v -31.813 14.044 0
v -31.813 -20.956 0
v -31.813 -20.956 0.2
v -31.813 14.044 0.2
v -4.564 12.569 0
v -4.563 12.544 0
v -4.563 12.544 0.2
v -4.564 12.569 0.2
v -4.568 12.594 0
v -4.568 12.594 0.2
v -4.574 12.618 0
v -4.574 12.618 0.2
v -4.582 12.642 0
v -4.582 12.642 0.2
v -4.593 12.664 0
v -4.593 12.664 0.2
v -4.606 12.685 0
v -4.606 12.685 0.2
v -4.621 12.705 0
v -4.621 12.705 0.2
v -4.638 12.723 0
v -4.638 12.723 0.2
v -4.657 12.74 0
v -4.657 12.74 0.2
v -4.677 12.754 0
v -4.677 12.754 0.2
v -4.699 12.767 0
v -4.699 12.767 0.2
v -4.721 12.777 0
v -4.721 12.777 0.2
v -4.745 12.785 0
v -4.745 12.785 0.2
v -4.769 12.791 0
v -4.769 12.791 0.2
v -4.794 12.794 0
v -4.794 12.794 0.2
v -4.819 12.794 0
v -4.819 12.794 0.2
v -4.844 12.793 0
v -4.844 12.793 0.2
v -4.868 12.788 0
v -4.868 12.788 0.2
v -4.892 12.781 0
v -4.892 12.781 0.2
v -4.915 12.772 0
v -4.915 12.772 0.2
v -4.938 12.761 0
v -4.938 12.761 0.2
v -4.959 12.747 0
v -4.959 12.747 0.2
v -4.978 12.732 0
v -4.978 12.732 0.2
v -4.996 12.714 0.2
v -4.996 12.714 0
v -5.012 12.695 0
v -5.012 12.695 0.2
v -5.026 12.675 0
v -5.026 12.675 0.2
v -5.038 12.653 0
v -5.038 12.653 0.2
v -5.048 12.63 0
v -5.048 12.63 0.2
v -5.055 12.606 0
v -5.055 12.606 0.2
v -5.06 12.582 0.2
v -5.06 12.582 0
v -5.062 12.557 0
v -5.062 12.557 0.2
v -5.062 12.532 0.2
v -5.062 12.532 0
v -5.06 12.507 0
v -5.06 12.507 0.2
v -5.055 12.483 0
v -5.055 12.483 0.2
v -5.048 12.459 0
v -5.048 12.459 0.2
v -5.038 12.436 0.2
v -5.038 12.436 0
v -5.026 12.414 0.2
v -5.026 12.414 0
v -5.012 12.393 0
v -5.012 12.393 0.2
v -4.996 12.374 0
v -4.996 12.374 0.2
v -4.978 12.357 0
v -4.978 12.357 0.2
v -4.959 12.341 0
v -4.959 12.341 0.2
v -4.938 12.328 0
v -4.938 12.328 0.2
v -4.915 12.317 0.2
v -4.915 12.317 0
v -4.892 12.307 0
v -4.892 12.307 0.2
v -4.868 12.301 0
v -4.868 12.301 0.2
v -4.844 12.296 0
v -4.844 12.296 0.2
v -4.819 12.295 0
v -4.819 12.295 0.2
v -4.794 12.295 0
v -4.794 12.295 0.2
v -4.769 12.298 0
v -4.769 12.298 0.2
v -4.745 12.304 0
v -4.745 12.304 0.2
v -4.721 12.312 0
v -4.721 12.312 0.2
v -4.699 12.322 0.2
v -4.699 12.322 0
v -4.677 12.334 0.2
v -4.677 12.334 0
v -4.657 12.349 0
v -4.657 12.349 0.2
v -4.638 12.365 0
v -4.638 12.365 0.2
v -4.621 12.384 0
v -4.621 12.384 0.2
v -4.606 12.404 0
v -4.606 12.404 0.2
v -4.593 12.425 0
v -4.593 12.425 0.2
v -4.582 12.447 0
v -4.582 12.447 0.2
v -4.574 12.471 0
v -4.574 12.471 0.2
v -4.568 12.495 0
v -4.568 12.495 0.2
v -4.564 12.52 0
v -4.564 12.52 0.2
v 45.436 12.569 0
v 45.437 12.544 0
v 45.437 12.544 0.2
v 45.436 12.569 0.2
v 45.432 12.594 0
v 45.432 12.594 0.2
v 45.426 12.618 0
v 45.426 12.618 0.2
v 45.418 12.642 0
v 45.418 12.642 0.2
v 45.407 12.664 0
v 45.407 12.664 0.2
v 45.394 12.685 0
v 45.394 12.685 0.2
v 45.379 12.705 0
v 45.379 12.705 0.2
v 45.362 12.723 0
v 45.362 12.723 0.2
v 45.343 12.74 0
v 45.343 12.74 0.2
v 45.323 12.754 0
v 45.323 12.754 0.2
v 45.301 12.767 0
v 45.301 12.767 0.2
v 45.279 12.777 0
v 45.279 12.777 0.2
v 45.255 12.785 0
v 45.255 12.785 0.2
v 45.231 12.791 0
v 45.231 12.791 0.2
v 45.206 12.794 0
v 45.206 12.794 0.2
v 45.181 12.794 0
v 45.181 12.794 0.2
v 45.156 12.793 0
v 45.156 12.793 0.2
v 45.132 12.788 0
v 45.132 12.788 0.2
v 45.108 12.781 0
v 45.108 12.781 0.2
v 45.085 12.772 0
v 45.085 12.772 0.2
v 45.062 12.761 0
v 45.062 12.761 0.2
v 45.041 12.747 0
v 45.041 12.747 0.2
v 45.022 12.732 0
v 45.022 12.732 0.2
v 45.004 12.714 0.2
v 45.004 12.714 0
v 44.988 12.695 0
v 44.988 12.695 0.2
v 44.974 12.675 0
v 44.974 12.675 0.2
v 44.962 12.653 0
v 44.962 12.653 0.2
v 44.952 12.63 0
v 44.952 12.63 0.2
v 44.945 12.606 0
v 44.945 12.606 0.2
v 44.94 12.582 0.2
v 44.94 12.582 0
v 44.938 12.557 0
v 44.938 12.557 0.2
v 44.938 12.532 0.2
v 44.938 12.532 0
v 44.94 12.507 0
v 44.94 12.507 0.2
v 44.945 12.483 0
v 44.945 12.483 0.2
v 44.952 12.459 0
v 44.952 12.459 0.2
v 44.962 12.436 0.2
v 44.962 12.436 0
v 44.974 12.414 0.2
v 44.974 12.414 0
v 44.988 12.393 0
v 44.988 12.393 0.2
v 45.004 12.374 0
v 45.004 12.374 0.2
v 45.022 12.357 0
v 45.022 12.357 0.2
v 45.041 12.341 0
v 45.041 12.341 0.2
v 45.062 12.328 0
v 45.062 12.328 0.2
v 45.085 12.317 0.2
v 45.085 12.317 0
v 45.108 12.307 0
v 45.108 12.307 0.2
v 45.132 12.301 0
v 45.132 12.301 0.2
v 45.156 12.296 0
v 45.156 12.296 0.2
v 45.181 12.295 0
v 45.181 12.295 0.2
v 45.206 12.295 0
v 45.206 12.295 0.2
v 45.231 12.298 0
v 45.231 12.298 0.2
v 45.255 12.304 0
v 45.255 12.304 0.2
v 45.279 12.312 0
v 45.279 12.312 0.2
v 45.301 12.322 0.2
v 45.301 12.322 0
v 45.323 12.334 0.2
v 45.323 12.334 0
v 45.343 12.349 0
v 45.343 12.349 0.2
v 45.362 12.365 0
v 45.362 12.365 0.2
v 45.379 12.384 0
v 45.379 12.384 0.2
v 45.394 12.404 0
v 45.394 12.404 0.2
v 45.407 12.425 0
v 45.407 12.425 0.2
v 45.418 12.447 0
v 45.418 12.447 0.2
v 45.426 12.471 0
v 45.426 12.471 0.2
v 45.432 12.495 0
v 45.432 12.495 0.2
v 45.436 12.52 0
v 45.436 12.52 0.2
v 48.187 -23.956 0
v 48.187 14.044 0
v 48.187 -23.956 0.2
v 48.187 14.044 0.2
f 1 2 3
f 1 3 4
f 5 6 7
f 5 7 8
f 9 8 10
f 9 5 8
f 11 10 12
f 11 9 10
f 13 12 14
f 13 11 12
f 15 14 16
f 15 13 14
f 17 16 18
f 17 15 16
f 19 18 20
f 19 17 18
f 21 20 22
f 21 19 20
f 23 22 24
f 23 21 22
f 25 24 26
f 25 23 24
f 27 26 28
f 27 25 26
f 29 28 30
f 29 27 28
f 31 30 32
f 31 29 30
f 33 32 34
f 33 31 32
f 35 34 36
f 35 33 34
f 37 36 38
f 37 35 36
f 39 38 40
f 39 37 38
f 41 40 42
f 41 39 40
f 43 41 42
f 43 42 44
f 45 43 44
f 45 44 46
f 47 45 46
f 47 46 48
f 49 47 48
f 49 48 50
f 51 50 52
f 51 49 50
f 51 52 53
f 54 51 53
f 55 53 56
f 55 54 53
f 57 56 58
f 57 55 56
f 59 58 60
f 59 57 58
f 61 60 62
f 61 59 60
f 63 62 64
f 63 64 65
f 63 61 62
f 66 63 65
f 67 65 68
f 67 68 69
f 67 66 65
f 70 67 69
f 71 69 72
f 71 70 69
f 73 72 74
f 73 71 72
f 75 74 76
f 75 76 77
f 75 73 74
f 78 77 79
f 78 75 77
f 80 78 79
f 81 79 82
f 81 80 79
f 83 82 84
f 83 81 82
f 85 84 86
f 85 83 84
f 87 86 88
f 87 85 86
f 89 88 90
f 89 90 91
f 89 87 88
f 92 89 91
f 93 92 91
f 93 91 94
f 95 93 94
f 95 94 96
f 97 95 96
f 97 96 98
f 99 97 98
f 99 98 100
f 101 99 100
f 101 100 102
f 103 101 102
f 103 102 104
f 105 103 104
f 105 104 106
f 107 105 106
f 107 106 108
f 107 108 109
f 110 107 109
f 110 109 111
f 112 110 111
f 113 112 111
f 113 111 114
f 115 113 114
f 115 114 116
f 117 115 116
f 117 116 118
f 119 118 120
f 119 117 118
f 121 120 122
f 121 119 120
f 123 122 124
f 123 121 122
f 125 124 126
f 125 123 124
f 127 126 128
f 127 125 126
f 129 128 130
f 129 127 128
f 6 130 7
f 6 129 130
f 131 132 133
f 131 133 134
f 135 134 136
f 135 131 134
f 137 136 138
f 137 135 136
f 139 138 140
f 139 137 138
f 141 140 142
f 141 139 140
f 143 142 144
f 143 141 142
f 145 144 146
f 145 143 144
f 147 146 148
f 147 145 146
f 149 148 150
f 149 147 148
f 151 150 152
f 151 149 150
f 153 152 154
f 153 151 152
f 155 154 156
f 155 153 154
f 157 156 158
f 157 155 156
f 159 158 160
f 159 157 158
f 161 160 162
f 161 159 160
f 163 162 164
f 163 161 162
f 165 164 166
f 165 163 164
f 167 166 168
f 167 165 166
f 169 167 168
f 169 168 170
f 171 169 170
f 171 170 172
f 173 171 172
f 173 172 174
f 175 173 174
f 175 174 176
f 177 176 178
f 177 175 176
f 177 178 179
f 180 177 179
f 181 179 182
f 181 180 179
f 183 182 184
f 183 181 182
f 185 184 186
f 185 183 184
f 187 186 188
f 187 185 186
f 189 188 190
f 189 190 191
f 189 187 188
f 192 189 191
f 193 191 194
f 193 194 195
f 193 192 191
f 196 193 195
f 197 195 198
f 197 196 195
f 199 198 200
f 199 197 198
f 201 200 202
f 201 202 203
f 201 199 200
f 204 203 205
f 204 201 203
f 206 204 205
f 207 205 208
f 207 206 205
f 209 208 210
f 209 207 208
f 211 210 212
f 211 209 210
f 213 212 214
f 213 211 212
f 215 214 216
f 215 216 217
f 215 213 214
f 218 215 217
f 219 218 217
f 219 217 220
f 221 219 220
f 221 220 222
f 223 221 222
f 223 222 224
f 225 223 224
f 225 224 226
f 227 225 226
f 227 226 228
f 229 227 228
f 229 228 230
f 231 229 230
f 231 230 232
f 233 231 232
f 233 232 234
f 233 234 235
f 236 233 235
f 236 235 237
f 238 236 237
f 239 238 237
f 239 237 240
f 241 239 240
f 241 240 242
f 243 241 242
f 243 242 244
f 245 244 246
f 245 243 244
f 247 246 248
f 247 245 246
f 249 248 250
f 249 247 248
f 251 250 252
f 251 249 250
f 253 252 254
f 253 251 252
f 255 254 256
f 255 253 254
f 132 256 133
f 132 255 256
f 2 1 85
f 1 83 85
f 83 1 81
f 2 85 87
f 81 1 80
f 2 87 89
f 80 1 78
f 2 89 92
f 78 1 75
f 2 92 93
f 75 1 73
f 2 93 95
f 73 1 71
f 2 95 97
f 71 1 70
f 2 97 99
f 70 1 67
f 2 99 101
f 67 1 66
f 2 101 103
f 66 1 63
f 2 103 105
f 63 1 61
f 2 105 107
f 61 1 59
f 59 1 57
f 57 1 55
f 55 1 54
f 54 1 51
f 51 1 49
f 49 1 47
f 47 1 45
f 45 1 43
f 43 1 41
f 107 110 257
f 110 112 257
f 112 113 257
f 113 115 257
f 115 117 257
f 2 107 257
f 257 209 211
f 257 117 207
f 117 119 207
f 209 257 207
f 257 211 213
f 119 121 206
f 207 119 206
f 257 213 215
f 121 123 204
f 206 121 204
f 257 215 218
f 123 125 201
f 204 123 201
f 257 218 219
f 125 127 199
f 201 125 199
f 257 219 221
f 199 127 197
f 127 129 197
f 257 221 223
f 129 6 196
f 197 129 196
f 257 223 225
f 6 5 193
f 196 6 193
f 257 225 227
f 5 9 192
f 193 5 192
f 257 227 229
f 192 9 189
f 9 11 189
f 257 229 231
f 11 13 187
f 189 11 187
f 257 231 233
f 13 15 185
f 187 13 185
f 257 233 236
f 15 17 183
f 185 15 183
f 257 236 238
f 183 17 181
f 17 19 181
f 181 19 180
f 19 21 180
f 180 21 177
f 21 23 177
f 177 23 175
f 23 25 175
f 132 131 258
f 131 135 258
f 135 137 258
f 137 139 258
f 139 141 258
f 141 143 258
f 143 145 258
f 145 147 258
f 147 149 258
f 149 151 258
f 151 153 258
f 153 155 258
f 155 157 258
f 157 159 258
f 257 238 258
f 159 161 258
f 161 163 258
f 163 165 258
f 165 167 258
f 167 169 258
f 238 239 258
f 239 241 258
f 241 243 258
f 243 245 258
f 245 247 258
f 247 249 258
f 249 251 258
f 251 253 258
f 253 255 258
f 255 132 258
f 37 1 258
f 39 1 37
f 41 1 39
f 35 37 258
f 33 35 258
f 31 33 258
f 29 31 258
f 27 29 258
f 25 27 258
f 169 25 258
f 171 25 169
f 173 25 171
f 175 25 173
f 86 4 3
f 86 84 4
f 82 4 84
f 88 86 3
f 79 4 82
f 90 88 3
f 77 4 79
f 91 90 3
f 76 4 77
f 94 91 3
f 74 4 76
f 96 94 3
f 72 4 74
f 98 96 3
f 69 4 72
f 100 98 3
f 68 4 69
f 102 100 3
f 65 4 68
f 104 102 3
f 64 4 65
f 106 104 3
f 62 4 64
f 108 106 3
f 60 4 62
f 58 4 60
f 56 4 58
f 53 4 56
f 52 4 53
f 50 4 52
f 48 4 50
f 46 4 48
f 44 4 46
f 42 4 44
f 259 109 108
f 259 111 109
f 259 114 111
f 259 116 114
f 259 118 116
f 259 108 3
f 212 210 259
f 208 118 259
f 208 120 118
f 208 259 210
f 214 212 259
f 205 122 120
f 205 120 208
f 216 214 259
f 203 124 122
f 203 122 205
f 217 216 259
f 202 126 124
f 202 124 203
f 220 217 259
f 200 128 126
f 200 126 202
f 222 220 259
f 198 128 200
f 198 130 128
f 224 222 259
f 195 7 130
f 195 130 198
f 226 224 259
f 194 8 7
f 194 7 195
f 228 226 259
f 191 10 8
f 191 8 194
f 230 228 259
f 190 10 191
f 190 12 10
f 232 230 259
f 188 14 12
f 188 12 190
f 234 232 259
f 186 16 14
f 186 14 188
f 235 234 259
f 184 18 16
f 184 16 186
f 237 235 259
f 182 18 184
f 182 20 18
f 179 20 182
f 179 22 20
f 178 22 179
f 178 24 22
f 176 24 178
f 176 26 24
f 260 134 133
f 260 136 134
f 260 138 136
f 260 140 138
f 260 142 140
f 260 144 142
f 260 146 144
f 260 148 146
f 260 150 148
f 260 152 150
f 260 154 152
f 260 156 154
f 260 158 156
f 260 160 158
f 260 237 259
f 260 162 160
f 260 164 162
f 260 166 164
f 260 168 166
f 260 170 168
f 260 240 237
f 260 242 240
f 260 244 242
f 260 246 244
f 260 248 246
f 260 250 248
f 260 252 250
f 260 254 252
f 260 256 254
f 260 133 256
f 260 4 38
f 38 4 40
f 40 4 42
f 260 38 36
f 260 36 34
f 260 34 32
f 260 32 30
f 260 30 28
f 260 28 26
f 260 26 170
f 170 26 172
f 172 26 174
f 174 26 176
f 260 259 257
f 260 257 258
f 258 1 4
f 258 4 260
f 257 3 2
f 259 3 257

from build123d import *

# Parameters (mm, degrees)
SKETCH1_W           = 80
SKETCH1_H           = 35
SKETCH1_R           = 0.25
BOSS_EXTRUDE4_DEPTH = 0.2
BOSS_EXTRUDE5_DEPTH = 0.2


with BuildPart() as part:
    # Sketch1 → Boss-Extrude4 (new body)
    with BuildSketch(Plane.XY):
        with Locations((8.187411056, -3.455555556)):
            Rectangle(SKETCH1_W, SKETCH1_H)
        with Locations((-4.812588944, 12.544444444)):
            Circle(SKETCH1_R, mode=Mode.SUBTRACT)
        with Locations((45.187411056, 12.544444444)):
            Circle(SKETCH1_R, mode=Mode.SUBTRACT)
    extrude(amount=BOSS_EXTRUDE4_DEPTH)

    # Sketch3 → Boss-Extrude5 (add)
    with BuildSketch(Plane.XY.offset(0.2)):
        Polygon((-31.812588944, -20.955555556), (48.187411056, -23.955555556), (48.187411056, -20.955555556), align=None)
    extrude(amount=-BOSS_EXTRUDE5_DEPTH)


solid = part.part
